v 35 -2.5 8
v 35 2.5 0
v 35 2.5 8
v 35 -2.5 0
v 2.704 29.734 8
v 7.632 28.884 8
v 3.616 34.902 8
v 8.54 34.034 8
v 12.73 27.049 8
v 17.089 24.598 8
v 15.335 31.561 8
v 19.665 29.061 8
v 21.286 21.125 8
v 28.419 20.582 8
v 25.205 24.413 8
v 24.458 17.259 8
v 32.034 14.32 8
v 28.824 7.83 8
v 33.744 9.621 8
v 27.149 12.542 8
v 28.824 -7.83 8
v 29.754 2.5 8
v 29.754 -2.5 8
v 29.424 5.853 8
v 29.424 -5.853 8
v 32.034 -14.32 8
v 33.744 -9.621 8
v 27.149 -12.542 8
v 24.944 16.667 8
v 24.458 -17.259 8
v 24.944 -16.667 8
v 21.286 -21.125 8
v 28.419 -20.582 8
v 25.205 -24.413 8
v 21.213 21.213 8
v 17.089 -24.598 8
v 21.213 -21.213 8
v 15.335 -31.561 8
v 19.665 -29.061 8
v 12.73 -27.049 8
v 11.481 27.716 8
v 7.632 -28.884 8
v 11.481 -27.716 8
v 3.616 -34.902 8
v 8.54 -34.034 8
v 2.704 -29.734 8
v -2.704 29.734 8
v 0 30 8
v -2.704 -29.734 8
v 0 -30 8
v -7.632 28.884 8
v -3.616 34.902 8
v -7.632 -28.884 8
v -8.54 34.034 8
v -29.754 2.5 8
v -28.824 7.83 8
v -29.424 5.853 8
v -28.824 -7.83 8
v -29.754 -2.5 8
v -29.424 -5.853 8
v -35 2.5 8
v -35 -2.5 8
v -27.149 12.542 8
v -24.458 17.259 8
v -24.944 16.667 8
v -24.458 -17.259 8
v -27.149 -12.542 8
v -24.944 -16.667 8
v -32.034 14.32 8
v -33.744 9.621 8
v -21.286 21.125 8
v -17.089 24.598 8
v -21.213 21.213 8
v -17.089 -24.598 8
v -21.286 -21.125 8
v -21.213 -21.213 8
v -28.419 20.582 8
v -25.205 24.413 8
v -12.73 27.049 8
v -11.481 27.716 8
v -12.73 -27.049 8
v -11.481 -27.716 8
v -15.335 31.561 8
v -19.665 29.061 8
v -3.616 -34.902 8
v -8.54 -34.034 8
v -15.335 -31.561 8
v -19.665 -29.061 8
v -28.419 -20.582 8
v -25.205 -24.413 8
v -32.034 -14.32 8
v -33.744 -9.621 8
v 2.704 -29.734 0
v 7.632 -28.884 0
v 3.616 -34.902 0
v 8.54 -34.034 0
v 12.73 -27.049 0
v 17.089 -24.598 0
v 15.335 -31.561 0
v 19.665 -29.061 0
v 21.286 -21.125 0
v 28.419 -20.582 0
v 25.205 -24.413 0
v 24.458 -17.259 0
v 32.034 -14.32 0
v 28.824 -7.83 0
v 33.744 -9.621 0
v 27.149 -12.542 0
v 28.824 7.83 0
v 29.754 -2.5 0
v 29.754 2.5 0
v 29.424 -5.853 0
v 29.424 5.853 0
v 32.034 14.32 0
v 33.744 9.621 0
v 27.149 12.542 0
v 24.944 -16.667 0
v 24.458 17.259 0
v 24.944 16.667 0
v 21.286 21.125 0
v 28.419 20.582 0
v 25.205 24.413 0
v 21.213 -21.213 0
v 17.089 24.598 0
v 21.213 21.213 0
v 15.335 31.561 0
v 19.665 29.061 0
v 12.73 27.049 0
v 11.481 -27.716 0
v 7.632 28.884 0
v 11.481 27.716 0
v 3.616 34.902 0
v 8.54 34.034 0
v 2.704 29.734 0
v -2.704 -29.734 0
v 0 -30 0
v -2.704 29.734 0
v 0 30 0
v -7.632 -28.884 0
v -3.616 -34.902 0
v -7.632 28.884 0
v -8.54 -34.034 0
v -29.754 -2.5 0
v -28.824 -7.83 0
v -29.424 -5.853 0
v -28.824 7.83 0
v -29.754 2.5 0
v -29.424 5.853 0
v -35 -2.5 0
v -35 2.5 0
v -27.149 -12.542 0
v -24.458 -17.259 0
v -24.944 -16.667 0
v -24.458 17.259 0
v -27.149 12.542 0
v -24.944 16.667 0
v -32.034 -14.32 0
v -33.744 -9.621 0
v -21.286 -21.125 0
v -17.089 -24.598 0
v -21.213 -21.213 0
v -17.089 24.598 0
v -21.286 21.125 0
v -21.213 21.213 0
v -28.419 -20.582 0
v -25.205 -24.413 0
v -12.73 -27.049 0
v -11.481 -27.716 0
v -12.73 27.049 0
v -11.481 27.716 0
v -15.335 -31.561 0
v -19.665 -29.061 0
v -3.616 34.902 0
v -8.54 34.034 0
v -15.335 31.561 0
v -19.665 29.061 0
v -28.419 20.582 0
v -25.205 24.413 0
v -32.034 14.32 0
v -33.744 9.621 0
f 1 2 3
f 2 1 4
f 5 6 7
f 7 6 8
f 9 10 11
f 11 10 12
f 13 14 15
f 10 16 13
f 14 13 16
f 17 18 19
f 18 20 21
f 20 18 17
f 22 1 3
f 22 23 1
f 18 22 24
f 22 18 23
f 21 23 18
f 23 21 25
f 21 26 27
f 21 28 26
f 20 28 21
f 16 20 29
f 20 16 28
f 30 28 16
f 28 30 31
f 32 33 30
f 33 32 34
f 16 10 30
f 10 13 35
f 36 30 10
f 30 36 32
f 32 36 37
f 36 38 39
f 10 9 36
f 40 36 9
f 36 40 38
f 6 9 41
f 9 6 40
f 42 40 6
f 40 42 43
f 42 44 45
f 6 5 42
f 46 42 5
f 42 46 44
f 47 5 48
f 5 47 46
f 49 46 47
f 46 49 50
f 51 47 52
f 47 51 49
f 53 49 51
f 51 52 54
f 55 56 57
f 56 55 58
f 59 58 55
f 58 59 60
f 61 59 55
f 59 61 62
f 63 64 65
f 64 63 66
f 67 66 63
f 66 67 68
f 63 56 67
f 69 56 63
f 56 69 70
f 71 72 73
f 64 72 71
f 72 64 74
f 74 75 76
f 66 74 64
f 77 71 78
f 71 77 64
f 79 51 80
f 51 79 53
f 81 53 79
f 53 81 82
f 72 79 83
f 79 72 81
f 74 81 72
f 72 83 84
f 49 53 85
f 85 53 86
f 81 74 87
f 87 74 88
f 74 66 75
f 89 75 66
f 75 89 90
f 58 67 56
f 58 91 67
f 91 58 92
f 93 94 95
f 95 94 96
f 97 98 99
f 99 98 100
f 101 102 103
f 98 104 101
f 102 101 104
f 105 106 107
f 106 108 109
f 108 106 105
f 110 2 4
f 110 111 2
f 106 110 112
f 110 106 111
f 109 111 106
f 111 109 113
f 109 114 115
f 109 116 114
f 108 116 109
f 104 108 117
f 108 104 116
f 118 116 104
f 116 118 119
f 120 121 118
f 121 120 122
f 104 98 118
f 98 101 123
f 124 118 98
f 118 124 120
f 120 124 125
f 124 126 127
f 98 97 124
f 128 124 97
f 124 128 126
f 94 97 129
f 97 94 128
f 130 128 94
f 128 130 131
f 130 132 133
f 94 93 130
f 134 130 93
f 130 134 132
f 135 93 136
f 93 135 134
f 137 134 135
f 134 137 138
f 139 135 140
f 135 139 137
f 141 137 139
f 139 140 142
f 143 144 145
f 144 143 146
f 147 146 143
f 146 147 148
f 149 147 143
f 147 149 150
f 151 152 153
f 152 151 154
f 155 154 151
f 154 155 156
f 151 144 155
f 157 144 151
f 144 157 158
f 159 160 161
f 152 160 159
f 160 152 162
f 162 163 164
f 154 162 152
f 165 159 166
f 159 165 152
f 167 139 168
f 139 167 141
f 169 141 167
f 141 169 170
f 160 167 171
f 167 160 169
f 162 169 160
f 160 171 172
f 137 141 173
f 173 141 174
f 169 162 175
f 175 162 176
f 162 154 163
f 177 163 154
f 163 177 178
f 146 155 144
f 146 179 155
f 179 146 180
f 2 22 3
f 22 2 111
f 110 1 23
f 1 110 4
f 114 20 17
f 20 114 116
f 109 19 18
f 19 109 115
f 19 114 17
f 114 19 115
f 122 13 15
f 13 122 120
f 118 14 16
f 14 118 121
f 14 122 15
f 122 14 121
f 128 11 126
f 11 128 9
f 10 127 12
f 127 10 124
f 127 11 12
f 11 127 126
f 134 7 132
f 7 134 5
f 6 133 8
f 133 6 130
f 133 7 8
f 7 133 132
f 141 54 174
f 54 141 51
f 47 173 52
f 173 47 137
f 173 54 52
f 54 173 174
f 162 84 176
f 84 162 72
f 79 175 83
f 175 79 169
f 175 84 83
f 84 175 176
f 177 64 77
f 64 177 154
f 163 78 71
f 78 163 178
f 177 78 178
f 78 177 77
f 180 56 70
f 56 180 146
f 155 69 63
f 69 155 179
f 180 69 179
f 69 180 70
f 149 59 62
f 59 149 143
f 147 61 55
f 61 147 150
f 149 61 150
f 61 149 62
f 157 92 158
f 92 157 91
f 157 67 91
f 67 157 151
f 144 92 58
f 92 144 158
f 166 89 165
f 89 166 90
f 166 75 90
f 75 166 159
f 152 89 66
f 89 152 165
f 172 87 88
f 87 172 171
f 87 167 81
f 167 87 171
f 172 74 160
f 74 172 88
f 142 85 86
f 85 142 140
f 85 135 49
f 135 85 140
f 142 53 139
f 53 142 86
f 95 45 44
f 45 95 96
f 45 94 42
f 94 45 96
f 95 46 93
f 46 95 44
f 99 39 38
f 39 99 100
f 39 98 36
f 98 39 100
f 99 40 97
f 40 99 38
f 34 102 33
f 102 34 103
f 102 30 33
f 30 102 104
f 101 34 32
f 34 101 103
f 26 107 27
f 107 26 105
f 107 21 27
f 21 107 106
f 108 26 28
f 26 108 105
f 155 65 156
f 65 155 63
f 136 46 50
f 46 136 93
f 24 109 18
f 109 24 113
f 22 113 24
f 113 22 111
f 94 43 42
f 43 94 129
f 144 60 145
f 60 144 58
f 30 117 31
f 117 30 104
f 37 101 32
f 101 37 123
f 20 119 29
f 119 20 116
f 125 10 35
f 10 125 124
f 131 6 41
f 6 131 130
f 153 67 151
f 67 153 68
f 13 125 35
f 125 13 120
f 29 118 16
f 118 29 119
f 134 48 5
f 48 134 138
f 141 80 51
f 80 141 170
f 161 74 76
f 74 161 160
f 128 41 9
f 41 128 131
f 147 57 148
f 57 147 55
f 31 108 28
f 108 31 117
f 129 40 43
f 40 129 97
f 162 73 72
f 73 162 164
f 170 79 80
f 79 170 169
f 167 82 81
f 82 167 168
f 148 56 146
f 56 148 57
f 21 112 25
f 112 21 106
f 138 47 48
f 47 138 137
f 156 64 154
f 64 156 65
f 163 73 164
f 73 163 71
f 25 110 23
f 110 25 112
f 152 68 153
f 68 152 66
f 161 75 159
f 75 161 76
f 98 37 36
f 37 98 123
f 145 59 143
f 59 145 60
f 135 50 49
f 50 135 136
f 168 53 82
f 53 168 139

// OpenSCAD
$fn = 32;

// ----------------------------------------------------------------------
// Spur blank: plain gear blank
// ----------------------------------------------------------------------

// --- parameters (mm) ---
disc_r = 30;              // blank root radius
disc_t = 8;               // blank thickness
n_teeth = 18;             // stub tooth count
tooth_w = 5;              // tooth width at the root
tooth_h = 5;              // tooth height above the root

out_r = disc_r + tooth_h;  // tip radius
bbox_x = 70.0;  // measured width over the teeth
bbox_y = 69.8;  // measured depth over the teeth

union() {
  cylinder(r = disc_r, h = disc_t);
  for (i = [0 : n_teeth - 1])
    rotate([0, 0, i * 360 / n_teeth])
      translate([disc_r - 1, -tooth_w / 2, 0])
        cube([tooth_h + 1, tooth_w, disc_t]);
}
